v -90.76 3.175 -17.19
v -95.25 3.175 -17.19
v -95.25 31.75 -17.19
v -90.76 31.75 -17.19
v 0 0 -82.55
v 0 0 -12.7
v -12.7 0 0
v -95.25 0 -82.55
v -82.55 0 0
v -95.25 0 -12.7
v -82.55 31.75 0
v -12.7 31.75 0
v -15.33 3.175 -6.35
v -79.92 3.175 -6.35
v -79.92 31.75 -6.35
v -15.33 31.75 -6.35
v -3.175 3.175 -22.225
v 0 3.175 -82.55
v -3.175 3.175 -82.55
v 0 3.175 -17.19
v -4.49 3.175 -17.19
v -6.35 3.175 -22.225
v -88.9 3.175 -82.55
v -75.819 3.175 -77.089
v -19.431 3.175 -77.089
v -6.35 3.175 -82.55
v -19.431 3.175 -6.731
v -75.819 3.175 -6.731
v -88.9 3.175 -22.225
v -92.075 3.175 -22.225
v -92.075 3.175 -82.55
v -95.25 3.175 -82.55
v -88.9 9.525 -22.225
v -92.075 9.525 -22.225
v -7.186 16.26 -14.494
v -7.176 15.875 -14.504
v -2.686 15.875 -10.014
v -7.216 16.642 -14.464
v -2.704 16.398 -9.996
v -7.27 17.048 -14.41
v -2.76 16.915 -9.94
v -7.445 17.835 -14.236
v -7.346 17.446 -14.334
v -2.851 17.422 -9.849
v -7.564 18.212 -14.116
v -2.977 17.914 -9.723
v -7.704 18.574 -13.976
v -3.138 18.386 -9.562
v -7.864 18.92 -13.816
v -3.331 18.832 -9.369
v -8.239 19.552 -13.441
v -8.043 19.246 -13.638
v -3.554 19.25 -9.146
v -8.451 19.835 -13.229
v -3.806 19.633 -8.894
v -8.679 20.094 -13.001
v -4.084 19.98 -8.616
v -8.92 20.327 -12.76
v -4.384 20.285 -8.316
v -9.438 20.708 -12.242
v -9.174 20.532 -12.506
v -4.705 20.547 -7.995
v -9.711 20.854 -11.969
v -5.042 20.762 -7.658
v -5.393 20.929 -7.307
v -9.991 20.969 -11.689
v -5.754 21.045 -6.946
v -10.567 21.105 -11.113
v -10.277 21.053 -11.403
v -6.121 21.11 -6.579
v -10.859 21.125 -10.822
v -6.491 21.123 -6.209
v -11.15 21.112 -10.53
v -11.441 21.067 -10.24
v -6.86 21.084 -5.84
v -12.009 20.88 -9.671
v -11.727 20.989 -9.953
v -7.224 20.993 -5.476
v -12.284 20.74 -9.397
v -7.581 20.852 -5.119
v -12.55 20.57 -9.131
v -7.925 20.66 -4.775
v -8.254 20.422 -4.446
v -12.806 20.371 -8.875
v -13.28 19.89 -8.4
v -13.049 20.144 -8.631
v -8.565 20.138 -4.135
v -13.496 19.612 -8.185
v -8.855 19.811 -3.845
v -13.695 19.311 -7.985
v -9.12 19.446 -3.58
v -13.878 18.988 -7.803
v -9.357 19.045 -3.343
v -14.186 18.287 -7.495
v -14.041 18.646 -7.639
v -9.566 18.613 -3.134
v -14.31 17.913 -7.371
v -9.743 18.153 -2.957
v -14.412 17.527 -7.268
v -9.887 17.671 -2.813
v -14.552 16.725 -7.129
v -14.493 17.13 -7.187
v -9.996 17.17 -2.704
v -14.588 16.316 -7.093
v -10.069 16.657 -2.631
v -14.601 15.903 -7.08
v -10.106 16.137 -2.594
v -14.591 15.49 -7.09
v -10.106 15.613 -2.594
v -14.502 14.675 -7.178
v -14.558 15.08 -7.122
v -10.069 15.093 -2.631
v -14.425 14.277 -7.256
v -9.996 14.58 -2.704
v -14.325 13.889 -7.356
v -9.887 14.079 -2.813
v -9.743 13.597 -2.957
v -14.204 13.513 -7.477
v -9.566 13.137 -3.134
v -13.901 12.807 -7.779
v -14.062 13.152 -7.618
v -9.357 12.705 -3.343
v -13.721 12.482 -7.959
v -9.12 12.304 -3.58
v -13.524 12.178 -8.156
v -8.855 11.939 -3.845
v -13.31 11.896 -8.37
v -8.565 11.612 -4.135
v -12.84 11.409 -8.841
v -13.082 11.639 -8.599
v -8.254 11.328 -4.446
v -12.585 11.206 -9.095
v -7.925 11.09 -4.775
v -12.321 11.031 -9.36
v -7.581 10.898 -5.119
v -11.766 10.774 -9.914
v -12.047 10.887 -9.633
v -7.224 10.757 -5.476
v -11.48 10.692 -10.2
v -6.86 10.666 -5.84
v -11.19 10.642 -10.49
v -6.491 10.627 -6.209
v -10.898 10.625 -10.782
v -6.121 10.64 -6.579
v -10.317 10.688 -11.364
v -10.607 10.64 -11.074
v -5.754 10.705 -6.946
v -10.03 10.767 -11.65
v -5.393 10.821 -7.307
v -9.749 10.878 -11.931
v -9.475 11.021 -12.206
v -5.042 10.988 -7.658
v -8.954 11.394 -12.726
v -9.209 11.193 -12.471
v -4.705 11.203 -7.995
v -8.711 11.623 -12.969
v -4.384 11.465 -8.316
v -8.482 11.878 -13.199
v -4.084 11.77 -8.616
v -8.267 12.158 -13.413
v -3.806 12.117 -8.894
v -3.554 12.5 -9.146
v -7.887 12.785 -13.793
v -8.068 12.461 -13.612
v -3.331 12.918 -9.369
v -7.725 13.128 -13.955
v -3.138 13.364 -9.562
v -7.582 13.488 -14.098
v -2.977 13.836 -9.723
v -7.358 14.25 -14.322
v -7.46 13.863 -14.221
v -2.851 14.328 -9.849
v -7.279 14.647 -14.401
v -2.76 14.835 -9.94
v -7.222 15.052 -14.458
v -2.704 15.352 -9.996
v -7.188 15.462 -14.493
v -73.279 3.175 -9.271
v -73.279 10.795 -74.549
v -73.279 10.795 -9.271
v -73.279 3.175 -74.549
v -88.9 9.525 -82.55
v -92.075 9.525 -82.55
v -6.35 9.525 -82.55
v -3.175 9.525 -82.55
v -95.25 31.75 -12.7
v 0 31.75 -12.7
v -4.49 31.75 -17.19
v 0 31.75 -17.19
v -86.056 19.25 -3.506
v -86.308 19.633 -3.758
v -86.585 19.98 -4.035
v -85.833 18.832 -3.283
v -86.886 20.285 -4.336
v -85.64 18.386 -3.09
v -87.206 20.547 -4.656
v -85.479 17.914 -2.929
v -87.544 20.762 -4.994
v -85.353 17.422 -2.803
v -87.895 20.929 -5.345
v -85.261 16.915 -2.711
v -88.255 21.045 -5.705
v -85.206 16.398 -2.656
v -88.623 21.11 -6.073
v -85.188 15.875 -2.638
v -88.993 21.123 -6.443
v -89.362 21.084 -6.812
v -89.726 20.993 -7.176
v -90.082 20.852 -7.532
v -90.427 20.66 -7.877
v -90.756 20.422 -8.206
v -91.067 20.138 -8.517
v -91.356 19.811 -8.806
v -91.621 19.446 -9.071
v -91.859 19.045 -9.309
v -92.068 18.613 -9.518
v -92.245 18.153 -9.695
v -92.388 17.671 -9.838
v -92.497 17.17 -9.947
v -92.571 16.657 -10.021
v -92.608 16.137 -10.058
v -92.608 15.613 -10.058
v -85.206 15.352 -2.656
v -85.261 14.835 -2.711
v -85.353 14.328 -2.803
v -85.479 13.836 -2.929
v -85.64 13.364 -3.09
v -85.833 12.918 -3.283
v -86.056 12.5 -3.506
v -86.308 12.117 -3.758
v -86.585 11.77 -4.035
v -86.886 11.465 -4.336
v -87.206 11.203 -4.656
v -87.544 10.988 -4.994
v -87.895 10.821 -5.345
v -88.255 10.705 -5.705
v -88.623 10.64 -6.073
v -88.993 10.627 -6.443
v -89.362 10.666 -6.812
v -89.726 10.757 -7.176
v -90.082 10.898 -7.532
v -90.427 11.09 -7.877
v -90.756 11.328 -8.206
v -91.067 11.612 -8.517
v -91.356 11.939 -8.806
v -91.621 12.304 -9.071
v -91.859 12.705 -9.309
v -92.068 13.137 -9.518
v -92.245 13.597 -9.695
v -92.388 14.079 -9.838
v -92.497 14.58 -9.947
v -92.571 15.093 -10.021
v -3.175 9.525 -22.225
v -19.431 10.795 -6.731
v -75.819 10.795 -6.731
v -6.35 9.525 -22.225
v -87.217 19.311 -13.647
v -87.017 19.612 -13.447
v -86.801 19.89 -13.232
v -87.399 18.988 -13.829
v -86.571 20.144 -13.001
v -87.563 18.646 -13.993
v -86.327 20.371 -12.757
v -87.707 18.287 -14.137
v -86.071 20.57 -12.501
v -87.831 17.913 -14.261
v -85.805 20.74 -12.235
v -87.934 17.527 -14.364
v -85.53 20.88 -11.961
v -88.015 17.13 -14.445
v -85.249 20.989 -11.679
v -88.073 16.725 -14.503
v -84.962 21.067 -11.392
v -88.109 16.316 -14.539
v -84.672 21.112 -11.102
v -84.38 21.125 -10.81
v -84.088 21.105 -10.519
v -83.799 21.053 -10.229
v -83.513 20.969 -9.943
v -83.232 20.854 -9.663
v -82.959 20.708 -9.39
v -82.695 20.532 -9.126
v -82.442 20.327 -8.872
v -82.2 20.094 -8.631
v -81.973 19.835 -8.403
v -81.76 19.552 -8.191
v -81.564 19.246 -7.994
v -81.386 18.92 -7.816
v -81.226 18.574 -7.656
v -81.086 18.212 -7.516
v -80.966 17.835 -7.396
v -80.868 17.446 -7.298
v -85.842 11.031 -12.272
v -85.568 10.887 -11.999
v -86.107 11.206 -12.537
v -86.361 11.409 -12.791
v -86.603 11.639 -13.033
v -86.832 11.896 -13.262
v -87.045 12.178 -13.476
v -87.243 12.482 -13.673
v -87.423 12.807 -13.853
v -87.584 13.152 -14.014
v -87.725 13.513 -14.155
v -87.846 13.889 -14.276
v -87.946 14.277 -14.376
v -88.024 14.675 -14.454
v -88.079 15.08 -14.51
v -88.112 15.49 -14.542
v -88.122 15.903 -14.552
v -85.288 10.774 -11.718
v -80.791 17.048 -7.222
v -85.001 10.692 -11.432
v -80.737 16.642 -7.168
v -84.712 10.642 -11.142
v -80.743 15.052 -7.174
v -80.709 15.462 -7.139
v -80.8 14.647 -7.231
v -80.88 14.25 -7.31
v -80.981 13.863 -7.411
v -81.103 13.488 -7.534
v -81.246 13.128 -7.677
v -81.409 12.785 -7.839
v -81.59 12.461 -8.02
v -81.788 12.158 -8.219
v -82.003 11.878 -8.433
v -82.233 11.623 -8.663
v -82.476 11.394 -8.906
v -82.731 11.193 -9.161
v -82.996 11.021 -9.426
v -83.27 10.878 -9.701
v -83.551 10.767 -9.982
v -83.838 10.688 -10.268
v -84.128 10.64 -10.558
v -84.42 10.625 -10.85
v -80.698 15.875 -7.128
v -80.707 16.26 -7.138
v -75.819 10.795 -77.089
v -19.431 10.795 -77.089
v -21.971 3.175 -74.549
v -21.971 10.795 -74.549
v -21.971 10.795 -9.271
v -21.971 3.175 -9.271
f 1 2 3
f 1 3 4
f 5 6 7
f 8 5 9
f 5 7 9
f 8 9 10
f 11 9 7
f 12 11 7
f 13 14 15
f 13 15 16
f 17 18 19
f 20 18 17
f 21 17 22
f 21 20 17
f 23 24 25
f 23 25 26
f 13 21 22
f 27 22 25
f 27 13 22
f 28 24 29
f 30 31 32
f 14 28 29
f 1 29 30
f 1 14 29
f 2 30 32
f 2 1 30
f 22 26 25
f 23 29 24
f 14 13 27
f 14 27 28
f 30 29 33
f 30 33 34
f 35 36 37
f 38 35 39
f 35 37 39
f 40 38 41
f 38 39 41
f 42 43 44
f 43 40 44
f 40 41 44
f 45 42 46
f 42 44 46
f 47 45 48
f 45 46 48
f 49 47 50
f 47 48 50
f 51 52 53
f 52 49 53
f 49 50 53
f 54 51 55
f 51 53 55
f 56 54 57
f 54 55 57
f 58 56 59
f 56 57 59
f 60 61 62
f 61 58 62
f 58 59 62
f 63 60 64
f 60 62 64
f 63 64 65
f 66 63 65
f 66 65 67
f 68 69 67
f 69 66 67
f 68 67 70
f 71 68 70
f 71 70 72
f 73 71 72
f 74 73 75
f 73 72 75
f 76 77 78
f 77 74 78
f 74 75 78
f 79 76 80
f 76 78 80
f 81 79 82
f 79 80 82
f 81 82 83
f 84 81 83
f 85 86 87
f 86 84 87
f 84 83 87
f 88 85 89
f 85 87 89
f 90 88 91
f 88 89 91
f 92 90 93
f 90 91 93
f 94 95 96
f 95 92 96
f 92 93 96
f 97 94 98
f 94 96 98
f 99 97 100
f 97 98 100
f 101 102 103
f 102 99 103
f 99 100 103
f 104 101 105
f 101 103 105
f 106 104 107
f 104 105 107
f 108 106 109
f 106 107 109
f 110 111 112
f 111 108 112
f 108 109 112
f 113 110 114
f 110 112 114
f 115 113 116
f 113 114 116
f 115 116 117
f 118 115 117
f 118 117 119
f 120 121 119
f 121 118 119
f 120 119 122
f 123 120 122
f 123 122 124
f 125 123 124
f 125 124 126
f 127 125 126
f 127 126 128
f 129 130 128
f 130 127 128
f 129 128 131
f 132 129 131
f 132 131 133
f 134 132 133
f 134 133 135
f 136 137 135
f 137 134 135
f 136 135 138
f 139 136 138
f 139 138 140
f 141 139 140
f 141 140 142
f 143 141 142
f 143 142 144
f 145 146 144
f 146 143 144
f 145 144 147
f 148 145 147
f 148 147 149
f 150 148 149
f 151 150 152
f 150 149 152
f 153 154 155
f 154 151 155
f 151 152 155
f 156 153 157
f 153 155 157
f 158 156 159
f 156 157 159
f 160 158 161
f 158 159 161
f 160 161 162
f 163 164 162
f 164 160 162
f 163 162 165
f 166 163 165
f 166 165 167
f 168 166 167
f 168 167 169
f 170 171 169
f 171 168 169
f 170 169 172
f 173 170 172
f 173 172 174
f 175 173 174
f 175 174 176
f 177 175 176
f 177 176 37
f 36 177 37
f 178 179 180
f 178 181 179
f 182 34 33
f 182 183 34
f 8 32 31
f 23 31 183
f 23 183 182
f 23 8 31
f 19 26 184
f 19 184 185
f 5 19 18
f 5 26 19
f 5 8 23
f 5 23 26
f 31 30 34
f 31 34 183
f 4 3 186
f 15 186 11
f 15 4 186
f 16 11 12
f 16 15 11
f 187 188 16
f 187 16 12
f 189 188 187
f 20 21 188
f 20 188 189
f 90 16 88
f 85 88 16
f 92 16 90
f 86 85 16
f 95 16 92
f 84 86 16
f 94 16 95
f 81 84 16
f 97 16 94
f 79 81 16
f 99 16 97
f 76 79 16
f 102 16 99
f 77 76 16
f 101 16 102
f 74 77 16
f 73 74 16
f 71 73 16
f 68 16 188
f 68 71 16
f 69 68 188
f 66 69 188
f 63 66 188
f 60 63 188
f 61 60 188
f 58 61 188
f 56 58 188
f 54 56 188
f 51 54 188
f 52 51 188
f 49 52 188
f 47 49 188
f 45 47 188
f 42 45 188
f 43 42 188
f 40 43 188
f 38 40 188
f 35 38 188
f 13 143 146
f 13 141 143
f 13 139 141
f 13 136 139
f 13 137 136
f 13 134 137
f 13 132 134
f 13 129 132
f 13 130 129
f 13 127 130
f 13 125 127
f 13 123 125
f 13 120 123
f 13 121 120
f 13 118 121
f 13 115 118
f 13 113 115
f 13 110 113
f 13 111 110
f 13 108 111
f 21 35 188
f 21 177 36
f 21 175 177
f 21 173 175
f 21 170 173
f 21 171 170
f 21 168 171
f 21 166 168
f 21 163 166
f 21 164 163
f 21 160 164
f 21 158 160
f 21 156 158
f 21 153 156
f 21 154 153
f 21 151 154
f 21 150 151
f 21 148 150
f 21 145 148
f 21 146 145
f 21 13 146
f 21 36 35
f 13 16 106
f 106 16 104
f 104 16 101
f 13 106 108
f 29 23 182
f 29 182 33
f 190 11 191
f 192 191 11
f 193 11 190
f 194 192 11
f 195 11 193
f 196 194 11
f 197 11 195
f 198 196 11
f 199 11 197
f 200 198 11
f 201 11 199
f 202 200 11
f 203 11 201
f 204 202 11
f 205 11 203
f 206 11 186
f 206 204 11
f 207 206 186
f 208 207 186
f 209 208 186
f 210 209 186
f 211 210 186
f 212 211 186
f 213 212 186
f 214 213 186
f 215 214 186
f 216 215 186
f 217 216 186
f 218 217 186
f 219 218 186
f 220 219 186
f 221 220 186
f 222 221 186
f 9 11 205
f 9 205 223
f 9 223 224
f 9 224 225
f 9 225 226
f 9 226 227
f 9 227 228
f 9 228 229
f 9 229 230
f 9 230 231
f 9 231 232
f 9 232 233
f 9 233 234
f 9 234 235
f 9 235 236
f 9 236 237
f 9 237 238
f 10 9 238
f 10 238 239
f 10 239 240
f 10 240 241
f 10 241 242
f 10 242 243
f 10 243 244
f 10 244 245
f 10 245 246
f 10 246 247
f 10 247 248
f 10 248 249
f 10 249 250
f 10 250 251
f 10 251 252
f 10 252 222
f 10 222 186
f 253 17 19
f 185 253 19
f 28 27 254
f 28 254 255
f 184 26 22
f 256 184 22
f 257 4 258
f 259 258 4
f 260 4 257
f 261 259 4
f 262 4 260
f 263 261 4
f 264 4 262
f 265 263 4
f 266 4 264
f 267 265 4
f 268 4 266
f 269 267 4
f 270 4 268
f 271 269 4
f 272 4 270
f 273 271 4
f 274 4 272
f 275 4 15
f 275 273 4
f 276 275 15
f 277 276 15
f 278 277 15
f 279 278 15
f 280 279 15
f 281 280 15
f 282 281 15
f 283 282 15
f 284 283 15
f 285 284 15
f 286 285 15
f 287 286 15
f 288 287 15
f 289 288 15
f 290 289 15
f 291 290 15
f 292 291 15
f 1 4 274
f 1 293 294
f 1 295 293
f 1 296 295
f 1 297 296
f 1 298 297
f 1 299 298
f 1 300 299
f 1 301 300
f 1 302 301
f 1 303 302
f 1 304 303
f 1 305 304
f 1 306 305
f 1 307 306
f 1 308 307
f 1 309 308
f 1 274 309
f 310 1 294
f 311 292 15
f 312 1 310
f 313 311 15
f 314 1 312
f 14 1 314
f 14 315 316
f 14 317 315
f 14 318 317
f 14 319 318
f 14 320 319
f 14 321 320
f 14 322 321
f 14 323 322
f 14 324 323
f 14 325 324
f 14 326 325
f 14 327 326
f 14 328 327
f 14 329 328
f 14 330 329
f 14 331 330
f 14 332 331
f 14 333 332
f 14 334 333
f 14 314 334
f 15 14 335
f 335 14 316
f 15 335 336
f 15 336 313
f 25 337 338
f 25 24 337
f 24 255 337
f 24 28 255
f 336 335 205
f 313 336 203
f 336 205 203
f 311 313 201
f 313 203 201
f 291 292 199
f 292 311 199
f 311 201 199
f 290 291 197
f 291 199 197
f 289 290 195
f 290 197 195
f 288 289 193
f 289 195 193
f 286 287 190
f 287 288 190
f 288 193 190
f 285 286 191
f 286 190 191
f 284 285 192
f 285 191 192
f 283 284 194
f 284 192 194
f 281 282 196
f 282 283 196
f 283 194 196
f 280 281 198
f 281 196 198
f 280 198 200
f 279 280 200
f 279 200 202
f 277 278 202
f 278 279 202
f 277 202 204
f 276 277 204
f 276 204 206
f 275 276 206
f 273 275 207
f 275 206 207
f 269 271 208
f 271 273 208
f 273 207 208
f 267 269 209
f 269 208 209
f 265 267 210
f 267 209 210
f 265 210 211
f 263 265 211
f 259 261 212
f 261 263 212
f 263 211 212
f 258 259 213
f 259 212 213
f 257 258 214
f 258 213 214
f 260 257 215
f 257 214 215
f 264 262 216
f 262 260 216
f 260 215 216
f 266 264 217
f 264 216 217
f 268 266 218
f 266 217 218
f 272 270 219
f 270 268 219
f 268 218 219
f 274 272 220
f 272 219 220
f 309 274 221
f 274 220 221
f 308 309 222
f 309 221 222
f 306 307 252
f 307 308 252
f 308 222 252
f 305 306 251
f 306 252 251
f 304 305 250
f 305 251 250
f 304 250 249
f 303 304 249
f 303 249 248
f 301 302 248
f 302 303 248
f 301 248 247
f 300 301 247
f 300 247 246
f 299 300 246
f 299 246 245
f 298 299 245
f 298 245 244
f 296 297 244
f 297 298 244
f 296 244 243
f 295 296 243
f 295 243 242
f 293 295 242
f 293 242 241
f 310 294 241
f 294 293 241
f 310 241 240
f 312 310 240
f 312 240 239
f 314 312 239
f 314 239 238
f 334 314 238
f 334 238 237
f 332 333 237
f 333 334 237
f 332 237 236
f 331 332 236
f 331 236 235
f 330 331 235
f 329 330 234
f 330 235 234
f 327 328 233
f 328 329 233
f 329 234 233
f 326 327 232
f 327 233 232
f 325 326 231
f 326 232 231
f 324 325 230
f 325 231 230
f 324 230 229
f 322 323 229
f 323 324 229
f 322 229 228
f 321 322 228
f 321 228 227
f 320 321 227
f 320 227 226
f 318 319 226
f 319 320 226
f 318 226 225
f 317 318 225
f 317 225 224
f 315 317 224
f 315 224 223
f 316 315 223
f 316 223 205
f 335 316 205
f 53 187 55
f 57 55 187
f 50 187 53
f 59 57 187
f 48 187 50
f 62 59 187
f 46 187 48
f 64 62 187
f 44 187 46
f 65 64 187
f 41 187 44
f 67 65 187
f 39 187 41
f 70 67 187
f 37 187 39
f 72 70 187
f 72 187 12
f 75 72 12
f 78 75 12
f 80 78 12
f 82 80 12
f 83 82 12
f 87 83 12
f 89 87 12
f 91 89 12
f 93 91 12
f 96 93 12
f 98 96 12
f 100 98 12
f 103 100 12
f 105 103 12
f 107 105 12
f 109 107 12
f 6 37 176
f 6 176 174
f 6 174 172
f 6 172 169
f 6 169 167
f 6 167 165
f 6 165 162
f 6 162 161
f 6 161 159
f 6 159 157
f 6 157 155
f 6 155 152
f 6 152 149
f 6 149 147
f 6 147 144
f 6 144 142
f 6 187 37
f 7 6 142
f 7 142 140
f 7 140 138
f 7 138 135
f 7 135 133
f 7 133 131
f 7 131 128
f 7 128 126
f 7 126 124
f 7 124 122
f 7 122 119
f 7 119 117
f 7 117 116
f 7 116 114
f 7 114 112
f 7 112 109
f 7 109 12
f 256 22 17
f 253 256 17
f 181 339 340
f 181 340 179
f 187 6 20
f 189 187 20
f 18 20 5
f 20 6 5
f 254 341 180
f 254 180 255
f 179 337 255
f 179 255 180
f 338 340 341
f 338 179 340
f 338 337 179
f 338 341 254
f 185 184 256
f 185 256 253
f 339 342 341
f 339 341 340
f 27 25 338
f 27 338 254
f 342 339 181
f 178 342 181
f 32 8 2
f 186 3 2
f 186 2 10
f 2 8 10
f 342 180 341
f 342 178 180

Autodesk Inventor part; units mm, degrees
ref_plane "YZ Plane" through (0, 0, 0) normal (1, 0, 0) x (0, 1, 0)
ref_plane "XZ Plane" through (0, 0, 0) normal (0, 1, 0) x (-1, 0, 0)
ref_plane "XY Plane" through (0, 0, 0) normal (0, 0, 1) x (1, 0, 0)
sketch "Sketch1" plane through (0, 0, 0) normal (0, 1, 0) x (-1, 0, 0)
  line L0 (0, 0) -> (95.25, 0)
  line L1 (95.25, 0) -> (95.25, -82.55)
  line L2 (95.25, -82.55) -> (0, -82.55)
  line L3 (0, -82.55) -> (0, 0)
  dimension "d0" = 95.25
  dimension "d1" = 82.55
extrude "Extrusion1" add sketch "Sketch1" along normal blind 3.175
chamfer "Chamfer1" distance 12.7 angle 45 2 edges at (-95.25, 1.5875, 0) (0, 1.5875, 0)
sketch "Sketch9" plane through (0, 3.175, 0) normal (0, 1, 0) x (1, 0, 0)
  line L0 (0, 12.7) -> (-12.7, 0) projected
  line L1 (0, 12.7) -> (0, 82.55) projected
  line L2 (0, 82.55) -> (-95.25, 82.55) projected
  line L3 (-95.25, 82.55) -> (-95.25, 12.7) projected
  line L4 (-82.55, 0) -> (-95.25, 12.7) projected
  line L5 (-82.55, 0) -> (-12.7, 0) projected
  line L6 (-95.25, 82.55) -> (0, 82.55) projected
  line L7 (-95.25, 12.7) -> (-95.25, 82.55) projected
  line L8 (-95.25, 17.1901) -> (-90.7599, 17.1901)
  line L9 (-90.7599, 17.1901) -> (-79.9197, 6.35)
  line L10 (-79.9197, 6.35) -> (-15.3303, 6.35)
  line L11 (-15.3303, 6.35) -> (-4.4901, 17.1901)
  line L12 (-4.4901, 17.1901) -> (0, 17.1901)
  line L13 (-95.25, 17.1901) -> (-95.25, 12.7)
  line L14 (-82.55, 0) -> (-95.25, 12.7)
  line L15 (-95.25, 12.7) -> (-82.55, 0) projected
  line L16 (-82.55, 0) -> (-12.7, 0)
  line L17 (-12.7, 0) -> (0, 12.7)
  line L18 (0, 12.7) -> (0, 17.1901)
  point P0 (0, 0)
  point P1 (-3.175, 98.425)
  point P2 (-3.175, 82.55)
  dimension "d59" = 65.3599
  dimension "d60" = 6.35
  dimension "d61" = 6.35
  dimension "d62" = 65.3599
  dimension "d63" = 6.35
extrude "Extrusion14" add sketch "Sketch9" along normal blind 28.575 contours L0 L5 L4 L3 L8 L9 L10 L11 L12 L1
sketch "Sketch12" plane through (0, 3.175, 0) normal (0, 1, 0) x (1, 0, 0)
  line L0 (0, 82.55) -> (-95.25, 82.55) projected
  line L1 (0, 82.55) -> (-3.175, 82.55)
  line L2 (-14.0151, 3.175) -> (-3.175, 14.0151) projected
  line L3 (-3.175, 82.55) -> (-6.35, 82.55)
  line L4 (-6.35, 82.55) -> (-6.35, 22.225)
  line L5 (-6.35, 22.225) -> (-3.175, 22.225)
  line L6 (-3.175, 22.225) -> (-3.175, 82.55)
  line L7 (-95.25, 82.55) -> (-92.075, 82.55)
  line L8 (-92.075, 82.55) -> (-88.9, 82.55)
  line L9 (-88.9, 82.55) -> (-88.9, 22.225)
  line L10 (-88.9, 22.225) -> (-92.075, 22.225)
  line L11 (-92.075, 22.225) -> (-92.075, 82.55)
  point P0 (0, 0)
  point P1 (0, 17.1901)
  dimension "d34" = 3.175
  dimension "d35" = 3.175
  dimension "d36" = 60.325
  dimension "d37" = 3.175
  dimension "d38" = 3.175
  dimension "d39" = 60.325
extrude "Extrusion10" add sketch "Sketch12" along normal blind 6.35
sketch "Sketch13" plane through (-12.7, 0, 0) normal (0.7071, 0, 0.7071) x (0.7071, 0, -0.7071)
  line L0 (0, 15.875) -> (17.824, 15.875)
  circle A0 centre (8.912, 15.875) radius 5.25
  line L1 (0, 0) -> (17.9605, 0) projected
  line L2 (0, 31.75) -> (0, 0) projected
  line L3 (17.9605, 0) -> (17.9605, 31.75) projected
  dimension "d43" = 10.5
  dimension "d66" = 15.875
extrude "Extrusion11" cut sketch "Sketch13" against normal up to next
sketch "Sketch14" plane through (-95.25, 0, -12.7) normal (-0.7071, 0, 0.7071) x (0.7071, 0, 0.7071)
  line L0 (17.9605, 15.875) -> (0, 15.875)
  circle A0 centre (8.9803, 15.875) radius 5.25
  line L1 (0, 0) -> (17.9605, 0) projected
  point P0 (76.3322, 0)
  point P1 (17.9605, 31.75)
  point P2 (0, 31.75)
  dimension "d46" = 10.5
  dimension "d67" = 15.875
extrude "Extrusion12" cut sketch "Sketch14" against normal up to next
sketch "Sketch15" plane through (0, 3.175, 0) normal (0, 1, 0) x (1, 0, 0)
  line L0 (-73.025, 74.295) -> (-22.225, 74.295)
  line L1 (-22.225, 74.295) -> (-22.225, 9.525)
  line L2 (-22.225, 9.525) -> (-73.025, 9.525)
  line L3 (-73.025, 9.525) -> (-73.025, 74.295)
  line L4 (-6.35, 22.225) -> (-6.35, 82.55) projected
  line L5 (-21.971, 74.549) -> (-73.279, 74.549)
  line L6 (-73.279, 74.549) -> (-73.279, 9.271)
  line L7 (-73.279, 9.271) -> (-21.971, 9.271)
  line L8 (-21.971, 9.271) -> (-21.971, 74.549)
  line L9 (-75.819, 77.089) -> (-19.431, 77.089)
  line L10 (-19.431, 77.089) -> (-19.431, 6.731)
  line L11 (-19.431, 6.731) -> (-75.819, 6.731)
  line L12 (-75.819, 6.731) -> (-75.819, 77.089)
  line L13 (-14.0151, 3.175) -> (-81.2349, 3.175) projected
  point P0 (0, 0)
  point P1 (-6.35, 10.8401)
  dimension "d49" = 50.8
  dimension "d50" = 64.77
  dimension "d53" = 0.254
  dimension "d54" = 2.54
  dimension "d57" = 6.35
extrude "Extrusion13" add sketch "Sketch15" along normal blind 7.62 contours L9 L10 L11 L12
properties part number "bottom-housing"
